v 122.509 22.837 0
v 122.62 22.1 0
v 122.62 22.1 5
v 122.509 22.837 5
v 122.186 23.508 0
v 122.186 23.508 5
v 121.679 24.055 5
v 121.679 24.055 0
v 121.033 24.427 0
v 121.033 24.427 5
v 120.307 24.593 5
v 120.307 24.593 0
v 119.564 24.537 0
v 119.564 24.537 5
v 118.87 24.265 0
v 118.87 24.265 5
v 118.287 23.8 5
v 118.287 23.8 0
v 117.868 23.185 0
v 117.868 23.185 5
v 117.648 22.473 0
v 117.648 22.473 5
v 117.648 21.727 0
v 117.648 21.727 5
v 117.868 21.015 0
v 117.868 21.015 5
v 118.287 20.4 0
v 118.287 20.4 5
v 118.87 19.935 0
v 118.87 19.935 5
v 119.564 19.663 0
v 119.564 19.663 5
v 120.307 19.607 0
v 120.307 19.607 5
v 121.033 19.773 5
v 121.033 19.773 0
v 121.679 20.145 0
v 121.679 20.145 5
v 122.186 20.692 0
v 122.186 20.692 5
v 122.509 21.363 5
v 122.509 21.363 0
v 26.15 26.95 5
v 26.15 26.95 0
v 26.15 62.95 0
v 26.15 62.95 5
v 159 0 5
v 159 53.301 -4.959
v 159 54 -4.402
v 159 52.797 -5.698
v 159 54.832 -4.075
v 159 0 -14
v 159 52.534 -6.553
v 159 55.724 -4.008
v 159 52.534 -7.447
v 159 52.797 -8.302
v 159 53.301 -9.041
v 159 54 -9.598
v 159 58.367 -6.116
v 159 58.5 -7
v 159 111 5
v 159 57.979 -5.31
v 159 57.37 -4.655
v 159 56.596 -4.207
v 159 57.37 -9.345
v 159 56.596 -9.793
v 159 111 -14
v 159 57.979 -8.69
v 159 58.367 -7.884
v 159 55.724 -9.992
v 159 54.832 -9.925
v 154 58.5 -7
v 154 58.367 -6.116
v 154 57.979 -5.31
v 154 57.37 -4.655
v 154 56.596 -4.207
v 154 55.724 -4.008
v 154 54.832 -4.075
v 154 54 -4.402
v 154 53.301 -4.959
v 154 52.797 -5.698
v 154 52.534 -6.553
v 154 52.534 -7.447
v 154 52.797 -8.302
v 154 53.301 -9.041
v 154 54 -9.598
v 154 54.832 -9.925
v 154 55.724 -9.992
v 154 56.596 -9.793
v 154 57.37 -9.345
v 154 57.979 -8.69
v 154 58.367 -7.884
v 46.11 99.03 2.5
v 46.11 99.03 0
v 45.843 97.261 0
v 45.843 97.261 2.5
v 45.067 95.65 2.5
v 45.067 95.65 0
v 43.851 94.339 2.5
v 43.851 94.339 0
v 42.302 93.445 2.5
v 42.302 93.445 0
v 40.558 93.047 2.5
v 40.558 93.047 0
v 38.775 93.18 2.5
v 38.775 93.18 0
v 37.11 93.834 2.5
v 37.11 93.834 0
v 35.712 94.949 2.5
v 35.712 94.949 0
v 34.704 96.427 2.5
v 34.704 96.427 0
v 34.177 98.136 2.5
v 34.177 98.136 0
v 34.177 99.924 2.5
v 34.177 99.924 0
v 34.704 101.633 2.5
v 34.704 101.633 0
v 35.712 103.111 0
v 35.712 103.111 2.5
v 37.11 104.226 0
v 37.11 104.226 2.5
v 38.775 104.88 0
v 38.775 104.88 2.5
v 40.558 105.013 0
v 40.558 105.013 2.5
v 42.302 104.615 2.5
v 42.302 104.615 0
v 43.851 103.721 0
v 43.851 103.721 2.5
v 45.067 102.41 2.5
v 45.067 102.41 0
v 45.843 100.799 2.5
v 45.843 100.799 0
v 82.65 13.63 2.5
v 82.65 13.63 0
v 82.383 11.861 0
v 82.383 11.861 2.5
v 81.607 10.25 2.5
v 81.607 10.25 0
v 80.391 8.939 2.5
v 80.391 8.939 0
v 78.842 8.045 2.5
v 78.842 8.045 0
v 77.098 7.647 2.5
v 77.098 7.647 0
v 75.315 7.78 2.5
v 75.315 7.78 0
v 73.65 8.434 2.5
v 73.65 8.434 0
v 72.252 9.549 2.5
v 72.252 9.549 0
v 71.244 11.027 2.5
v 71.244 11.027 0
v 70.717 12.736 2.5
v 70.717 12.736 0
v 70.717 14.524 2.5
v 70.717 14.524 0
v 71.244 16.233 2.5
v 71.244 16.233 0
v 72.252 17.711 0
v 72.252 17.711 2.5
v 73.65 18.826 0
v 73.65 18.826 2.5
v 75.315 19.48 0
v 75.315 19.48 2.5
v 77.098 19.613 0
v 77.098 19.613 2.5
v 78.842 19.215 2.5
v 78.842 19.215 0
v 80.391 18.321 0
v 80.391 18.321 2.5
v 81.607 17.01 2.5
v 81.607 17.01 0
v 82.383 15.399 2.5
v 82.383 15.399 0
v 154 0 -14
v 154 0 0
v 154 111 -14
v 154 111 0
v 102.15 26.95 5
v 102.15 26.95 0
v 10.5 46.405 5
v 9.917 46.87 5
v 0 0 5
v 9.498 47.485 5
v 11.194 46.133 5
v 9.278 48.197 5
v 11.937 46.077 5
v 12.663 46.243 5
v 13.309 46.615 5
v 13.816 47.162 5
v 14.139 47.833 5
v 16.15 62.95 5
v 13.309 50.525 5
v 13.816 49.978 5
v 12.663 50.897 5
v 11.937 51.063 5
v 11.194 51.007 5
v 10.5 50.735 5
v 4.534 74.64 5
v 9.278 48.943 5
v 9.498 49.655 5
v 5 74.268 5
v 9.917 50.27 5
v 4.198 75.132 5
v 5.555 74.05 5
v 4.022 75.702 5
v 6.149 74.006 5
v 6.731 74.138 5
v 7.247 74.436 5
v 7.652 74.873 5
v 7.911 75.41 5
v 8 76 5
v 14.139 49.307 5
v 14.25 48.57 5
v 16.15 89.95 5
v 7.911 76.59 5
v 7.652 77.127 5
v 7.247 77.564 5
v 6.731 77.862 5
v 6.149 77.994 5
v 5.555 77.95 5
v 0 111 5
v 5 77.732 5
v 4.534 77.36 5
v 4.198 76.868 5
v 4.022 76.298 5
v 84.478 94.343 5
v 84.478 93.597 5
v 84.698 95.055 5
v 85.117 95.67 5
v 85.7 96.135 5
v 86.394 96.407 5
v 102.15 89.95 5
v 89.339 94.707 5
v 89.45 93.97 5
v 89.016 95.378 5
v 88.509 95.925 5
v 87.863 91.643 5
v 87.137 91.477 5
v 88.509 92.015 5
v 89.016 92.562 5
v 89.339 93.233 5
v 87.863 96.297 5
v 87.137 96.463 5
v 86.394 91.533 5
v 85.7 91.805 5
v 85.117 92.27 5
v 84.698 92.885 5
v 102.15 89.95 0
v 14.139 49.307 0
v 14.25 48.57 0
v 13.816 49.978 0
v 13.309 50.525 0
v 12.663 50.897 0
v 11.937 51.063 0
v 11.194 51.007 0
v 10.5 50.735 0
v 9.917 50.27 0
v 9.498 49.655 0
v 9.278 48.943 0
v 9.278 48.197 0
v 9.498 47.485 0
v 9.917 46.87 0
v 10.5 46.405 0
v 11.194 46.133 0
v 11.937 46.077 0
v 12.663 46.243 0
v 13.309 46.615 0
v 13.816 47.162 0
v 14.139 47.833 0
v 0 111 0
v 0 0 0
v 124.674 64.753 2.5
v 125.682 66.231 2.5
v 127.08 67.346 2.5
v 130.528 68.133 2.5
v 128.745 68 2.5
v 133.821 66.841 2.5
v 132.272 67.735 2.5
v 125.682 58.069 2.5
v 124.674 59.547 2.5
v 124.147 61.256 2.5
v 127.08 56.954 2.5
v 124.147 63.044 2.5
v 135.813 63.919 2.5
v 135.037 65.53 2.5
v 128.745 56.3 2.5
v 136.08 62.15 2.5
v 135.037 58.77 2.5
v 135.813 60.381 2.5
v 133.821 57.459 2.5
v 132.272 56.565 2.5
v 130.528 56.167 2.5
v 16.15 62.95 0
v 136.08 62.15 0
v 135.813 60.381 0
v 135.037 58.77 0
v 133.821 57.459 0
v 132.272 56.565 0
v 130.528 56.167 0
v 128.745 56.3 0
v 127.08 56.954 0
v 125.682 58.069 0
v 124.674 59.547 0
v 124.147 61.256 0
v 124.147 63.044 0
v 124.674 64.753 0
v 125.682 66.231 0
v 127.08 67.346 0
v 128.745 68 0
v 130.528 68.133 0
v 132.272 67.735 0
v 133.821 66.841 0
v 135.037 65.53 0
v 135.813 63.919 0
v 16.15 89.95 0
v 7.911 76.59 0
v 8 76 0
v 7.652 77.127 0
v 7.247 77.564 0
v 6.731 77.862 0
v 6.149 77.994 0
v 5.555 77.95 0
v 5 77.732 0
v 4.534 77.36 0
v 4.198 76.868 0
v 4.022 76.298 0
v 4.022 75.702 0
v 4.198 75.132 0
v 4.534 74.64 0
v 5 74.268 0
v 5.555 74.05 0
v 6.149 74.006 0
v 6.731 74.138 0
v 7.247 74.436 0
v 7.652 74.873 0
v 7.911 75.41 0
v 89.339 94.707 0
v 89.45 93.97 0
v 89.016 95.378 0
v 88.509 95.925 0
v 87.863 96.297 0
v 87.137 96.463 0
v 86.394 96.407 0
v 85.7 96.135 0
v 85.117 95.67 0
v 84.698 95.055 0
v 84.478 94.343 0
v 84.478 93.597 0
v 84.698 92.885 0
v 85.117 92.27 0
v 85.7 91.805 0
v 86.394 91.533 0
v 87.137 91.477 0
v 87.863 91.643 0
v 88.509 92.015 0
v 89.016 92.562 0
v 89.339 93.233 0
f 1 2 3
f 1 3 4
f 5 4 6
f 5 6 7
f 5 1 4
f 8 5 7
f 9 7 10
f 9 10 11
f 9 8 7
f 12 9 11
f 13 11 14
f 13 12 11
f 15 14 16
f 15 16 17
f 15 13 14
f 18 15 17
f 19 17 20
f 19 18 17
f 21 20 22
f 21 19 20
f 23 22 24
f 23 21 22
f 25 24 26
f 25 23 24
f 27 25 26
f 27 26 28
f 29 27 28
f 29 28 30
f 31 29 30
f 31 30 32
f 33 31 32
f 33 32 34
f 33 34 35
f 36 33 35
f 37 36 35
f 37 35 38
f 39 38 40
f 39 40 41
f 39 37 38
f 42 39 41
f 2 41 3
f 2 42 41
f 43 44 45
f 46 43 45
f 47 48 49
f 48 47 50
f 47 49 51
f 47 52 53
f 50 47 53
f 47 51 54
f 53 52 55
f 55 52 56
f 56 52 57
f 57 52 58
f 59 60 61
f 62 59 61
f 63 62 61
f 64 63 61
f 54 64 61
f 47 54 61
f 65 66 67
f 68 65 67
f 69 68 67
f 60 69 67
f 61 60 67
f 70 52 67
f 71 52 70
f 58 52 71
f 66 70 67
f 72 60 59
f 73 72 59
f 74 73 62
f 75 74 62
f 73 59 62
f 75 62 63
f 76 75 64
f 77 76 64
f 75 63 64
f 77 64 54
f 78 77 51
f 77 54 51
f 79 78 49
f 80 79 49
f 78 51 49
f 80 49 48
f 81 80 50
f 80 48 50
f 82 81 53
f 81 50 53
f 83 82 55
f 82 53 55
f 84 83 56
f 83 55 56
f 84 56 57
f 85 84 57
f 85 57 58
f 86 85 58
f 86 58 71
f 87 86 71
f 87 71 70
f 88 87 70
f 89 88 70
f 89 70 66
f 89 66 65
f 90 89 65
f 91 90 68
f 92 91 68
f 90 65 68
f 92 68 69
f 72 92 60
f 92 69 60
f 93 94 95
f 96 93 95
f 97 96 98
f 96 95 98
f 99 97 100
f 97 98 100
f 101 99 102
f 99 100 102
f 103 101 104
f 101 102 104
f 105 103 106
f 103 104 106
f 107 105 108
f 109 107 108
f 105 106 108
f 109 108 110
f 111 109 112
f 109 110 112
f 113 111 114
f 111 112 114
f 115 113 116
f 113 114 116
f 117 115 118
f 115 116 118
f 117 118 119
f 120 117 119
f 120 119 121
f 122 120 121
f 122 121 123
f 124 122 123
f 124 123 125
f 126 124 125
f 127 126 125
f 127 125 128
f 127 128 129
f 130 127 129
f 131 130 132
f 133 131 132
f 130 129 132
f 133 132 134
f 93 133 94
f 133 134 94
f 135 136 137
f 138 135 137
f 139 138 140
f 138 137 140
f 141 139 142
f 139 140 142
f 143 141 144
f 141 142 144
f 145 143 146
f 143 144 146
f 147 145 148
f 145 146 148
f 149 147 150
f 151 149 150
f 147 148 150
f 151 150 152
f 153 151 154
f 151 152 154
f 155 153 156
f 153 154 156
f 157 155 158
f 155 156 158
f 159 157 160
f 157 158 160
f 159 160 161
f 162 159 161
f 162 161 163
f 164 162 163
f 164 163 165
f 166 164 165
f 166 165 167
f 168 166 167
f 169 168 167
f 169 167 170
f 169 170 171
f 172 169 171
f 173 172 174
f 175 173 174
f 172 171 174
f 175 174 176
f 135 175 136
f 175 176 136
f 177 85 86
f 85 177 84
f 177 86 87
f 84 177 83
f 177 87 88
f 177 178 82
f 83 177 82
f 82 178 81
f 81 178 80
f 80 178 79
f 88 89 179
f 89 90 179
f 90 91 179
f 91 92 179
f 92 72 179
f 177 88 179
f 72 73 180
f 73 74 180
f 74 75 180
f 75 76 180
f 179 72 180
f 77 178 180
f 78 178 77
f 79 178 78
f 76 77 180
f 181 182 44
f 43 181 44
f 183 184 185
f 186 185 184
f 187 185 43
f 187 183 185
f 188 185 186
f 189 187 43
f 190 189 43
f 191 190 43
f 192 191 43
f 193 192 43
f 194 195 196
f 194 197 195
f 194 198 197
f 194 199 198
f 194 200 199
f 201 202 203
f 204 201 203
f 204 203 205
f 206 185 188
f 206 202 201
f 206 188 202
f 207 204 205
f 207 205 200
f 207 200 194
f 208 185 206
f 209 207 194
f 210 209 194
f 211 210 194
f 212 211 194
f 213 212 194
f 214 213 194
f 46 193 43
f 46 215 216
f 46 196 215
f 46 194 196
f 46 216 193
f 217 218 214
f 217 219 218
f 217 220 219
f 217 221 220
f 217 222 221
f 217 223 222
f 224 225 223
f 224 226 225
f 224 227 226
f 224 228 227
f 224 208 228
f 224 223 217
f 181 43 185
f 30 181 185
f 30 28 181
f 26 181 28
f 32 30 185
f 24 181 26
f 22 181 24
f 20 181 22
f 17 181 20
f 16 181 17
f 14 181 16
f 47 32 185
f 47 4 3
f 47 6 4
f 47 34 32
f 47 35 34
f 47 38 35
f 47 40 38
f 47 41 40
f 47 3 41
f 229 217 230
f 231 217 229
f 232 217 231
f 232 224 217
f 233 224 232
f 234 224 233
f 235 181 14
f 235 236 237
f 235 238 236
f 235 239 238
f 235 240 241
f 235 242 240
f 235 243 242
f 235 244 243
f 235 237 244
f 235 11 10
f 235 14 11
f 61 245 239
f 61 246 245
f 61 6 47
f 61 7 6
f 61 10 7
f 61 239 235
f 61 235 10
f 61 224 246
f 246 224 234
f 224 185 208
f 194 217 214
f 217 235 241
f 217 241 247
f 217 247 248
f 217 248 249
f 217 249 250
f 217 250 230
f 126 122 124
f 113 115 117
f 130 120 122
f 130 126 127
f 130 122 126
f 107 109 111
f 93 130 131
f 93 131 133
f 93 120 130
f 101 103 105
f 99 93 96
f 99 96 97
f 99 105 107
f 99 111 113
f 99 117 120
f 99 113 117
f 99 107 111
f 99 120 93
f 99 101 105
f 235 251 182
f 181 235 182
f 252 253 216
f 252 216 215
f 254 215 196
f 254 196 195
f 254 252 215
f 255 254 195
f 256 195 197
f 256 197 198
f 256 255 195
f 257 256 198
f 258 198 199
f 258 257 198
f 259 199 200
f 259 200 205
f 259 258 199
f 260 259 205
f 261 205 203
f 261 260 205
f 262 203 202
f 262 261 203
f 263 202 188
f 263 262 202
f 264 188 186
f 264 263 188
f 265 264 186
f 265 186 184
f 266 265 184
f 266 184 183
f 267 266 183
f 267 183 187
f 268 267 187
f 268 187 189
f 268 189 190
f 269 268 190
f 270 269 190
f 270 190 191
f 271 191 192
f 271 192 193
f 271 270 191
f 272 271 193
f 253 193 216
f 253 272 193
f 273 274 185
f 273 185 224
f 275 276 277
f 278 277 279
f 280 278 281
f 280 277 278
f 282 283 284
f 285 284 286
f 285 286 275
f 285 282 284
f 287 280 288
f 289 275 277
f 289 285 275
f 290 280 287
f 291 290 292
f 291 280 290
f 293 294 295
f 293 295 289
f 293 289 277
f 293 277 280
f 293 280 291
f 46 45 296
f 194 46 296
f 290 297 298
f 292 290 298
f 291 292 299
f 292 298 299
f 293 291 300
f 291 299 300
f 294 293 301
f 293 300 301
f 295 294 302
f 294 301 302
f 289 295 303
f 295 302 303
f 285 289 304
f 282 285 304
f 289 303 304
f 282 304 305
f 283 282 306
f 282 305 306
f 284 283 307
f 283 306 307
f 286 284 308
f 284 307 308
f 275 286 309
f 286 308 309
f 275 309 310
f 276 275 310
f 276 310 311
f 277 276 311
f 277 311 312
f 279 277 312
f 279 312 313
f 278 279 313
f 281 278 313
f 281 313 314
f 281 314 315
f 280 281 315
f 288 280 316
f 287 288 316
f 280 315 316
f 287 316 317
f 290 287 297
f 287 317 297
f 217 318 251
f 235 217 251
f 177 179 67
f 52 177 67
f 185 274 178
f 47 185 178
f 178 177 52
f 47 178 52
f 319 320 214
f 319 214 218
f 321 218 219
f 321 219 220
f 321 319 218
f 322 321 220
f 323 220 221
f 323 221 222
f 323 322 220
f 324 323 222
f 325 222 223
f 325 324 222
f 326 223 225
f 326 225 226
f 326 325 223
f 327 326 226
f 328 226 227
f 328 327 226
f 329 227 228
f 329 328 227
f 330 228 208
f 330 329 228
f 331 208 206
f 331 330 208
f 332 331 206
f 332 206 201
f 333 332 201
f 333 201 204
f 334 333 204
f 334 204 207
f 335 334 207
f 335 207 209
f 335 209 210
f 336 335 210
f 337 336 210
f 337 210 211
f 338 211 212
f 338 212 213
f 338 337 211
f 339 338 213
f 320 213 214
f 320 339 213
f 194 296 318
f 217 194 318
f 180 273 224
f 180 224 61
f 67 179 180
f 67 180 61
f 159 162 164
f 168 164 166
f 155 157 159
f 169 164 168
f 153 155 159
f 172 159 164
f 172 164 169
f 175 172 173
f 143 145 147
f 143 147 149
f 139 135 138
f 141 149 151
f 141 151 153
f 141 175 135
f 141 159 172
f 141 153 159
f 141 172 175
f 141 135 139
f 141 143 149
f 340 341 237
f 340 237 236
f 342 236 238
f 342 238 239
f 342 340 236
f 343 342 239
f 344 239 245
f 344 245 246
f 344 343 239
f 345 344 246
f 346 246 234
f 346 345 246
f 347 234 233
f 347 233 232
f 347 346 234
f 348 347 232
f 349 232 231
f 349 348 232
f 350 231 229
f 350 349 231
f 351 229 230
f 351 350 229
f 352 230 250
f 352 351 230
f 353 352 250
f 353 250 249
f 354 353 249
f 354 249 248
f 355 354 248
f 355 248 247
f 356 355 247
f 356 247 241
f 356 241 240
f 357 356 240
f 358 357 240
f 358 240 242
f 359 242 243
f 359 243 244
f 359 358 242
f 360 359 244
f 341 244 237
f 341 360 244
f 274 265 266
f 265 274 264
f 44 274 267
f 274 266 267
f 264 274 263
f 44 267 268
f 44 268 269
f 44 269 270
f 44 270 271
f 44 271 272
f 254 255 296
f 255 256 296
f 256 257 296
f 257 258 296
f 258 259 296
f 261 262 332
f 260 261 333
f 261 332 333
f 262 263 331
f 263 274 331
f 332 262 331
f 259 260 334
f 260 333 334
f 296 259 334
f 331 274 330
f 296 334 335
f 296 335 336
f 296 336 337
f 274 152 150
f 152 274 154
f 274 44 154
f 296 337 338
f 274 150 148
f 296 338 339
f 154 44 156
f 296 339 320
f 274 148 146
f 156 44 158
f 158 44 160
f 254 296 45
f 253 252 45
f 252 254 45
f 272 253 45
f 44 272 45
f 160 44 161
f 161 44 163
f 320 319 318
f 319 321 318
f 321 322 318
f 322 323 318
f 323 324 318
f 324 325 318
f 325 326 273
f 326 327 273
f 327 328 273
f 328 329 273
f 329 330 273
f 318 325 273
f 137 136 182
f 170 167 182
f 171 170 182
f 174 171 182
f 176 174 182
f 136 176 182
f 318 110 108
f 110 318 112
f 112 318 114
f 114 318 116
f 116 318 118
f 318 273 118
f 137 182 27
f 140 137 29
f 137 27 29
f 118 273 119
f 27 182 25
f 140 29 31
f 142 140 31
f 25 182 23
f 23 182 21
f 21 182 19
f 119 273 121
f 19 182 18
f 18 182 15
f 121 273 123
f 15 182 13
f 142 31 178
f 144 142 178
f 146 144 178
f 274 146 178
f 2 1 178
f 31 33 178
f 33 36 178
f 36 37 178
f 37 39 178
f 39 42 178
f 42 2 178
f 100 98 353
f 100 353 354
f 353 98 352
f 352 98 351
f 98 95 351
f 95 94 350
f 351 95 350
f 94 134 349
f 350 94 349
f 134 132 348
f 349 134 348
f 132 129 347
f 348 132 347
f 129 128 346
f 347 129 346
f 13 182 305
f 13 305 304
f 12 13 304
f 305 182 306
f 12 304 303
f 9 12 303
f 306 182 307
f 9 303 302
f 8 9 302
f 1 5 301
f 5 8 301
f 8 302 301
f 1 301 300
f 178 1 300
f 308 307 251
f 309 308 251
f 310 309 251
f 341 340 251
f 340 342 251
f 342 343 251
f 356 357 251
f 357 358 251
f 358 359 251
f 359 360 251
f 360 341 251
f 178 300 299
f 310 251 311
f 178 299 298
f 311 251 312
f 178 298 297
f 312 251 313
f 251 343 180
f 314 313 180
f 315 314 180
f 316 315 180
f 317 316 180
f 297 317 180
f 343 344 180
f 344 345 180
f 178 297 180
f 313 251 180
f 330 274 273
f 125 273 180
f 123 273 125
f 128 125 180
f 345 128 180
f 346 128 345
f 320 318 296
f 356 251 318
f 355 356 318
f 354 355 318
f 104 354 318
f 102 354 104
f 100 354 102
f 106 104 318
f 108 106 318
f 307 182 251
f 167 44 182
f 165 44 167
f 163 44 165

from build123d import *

# Parameters (mm, degrees)
F0_W     = 159
F0_H     = 111
F0_R     = 2.5
F0_R_2   = 2
F1_DEPTH = 5
F2_W     = 5
F2_H     = 111
F3_DEPTH = 19
F4_R     = 3
F5_DEPTH = 5
F6_R     = 6
F7_DEPTH = 2.5


with BuildPart() as f1:
    # F0 (on Top) → F1 (new body)
    with BuildSketch(Plane.XY):
        with Locations((79.5, 55.5)):
            Rectangle(F0_W, F0_H)
        with Locations((11.75, 48.57)):
            Circle(F0_R, mode=Mode.SUBTRACT)
        with Locations((120.12, 22.1)):
            Circle(F0_R, mode=Mode.SUBTRACT)
        with Locations((6, 76)):
            Circle(F0_R_2, mode=Mode.SUBTRACT)
        Polygon((16.15, 62.95), (16.15, 89.95), (102.15, 89.95), (102.15, 26.95), (26.15, 26.95), (26.15, 62.95), align=None, mode=Mode.SUBTRACT)
        with Locations((86.95, 93.97)):
            Circle(F0_R, mode=Mode.SUBTRACT)
    extrude(amount=F1_DEPTH)

    # F2 (on face) → F3 (join)
    with BuildSketch(Plane.XY.offset(5)):
        with Locations((156.5, 55.5)):
            Rectangle(F2_W, F2_H)
    extrude(amount=-F3_DEPTH)

    # F4 (on face) → F5 (cut)
    with BuildSketch(Plane.YZ.offset(159)):
        with Locations((55.5, -7)):
            Circle(F4_R)
    extrude(amount=-F5_DEPTH, mode=Mode.SUBTRACT)

    # F6 (on face) → F7 (cut)
    with BuildSketch(Plane(origin=(0, 0, 0), x_dir=(1, 0, 0), z_dir=(0, 0, -1))):
        with Locations((76.65, -13.63)):
            Circle(F6_R)
        with Locations((130.08, -62.15)):
            Circle(F6_R)
        with Locations((40.11, -99.03)):
            Circle(F6_R)
    extrude(amount=-F7_DEPTH, mode=Mode.SUBTRACT)


solid = f1.part
